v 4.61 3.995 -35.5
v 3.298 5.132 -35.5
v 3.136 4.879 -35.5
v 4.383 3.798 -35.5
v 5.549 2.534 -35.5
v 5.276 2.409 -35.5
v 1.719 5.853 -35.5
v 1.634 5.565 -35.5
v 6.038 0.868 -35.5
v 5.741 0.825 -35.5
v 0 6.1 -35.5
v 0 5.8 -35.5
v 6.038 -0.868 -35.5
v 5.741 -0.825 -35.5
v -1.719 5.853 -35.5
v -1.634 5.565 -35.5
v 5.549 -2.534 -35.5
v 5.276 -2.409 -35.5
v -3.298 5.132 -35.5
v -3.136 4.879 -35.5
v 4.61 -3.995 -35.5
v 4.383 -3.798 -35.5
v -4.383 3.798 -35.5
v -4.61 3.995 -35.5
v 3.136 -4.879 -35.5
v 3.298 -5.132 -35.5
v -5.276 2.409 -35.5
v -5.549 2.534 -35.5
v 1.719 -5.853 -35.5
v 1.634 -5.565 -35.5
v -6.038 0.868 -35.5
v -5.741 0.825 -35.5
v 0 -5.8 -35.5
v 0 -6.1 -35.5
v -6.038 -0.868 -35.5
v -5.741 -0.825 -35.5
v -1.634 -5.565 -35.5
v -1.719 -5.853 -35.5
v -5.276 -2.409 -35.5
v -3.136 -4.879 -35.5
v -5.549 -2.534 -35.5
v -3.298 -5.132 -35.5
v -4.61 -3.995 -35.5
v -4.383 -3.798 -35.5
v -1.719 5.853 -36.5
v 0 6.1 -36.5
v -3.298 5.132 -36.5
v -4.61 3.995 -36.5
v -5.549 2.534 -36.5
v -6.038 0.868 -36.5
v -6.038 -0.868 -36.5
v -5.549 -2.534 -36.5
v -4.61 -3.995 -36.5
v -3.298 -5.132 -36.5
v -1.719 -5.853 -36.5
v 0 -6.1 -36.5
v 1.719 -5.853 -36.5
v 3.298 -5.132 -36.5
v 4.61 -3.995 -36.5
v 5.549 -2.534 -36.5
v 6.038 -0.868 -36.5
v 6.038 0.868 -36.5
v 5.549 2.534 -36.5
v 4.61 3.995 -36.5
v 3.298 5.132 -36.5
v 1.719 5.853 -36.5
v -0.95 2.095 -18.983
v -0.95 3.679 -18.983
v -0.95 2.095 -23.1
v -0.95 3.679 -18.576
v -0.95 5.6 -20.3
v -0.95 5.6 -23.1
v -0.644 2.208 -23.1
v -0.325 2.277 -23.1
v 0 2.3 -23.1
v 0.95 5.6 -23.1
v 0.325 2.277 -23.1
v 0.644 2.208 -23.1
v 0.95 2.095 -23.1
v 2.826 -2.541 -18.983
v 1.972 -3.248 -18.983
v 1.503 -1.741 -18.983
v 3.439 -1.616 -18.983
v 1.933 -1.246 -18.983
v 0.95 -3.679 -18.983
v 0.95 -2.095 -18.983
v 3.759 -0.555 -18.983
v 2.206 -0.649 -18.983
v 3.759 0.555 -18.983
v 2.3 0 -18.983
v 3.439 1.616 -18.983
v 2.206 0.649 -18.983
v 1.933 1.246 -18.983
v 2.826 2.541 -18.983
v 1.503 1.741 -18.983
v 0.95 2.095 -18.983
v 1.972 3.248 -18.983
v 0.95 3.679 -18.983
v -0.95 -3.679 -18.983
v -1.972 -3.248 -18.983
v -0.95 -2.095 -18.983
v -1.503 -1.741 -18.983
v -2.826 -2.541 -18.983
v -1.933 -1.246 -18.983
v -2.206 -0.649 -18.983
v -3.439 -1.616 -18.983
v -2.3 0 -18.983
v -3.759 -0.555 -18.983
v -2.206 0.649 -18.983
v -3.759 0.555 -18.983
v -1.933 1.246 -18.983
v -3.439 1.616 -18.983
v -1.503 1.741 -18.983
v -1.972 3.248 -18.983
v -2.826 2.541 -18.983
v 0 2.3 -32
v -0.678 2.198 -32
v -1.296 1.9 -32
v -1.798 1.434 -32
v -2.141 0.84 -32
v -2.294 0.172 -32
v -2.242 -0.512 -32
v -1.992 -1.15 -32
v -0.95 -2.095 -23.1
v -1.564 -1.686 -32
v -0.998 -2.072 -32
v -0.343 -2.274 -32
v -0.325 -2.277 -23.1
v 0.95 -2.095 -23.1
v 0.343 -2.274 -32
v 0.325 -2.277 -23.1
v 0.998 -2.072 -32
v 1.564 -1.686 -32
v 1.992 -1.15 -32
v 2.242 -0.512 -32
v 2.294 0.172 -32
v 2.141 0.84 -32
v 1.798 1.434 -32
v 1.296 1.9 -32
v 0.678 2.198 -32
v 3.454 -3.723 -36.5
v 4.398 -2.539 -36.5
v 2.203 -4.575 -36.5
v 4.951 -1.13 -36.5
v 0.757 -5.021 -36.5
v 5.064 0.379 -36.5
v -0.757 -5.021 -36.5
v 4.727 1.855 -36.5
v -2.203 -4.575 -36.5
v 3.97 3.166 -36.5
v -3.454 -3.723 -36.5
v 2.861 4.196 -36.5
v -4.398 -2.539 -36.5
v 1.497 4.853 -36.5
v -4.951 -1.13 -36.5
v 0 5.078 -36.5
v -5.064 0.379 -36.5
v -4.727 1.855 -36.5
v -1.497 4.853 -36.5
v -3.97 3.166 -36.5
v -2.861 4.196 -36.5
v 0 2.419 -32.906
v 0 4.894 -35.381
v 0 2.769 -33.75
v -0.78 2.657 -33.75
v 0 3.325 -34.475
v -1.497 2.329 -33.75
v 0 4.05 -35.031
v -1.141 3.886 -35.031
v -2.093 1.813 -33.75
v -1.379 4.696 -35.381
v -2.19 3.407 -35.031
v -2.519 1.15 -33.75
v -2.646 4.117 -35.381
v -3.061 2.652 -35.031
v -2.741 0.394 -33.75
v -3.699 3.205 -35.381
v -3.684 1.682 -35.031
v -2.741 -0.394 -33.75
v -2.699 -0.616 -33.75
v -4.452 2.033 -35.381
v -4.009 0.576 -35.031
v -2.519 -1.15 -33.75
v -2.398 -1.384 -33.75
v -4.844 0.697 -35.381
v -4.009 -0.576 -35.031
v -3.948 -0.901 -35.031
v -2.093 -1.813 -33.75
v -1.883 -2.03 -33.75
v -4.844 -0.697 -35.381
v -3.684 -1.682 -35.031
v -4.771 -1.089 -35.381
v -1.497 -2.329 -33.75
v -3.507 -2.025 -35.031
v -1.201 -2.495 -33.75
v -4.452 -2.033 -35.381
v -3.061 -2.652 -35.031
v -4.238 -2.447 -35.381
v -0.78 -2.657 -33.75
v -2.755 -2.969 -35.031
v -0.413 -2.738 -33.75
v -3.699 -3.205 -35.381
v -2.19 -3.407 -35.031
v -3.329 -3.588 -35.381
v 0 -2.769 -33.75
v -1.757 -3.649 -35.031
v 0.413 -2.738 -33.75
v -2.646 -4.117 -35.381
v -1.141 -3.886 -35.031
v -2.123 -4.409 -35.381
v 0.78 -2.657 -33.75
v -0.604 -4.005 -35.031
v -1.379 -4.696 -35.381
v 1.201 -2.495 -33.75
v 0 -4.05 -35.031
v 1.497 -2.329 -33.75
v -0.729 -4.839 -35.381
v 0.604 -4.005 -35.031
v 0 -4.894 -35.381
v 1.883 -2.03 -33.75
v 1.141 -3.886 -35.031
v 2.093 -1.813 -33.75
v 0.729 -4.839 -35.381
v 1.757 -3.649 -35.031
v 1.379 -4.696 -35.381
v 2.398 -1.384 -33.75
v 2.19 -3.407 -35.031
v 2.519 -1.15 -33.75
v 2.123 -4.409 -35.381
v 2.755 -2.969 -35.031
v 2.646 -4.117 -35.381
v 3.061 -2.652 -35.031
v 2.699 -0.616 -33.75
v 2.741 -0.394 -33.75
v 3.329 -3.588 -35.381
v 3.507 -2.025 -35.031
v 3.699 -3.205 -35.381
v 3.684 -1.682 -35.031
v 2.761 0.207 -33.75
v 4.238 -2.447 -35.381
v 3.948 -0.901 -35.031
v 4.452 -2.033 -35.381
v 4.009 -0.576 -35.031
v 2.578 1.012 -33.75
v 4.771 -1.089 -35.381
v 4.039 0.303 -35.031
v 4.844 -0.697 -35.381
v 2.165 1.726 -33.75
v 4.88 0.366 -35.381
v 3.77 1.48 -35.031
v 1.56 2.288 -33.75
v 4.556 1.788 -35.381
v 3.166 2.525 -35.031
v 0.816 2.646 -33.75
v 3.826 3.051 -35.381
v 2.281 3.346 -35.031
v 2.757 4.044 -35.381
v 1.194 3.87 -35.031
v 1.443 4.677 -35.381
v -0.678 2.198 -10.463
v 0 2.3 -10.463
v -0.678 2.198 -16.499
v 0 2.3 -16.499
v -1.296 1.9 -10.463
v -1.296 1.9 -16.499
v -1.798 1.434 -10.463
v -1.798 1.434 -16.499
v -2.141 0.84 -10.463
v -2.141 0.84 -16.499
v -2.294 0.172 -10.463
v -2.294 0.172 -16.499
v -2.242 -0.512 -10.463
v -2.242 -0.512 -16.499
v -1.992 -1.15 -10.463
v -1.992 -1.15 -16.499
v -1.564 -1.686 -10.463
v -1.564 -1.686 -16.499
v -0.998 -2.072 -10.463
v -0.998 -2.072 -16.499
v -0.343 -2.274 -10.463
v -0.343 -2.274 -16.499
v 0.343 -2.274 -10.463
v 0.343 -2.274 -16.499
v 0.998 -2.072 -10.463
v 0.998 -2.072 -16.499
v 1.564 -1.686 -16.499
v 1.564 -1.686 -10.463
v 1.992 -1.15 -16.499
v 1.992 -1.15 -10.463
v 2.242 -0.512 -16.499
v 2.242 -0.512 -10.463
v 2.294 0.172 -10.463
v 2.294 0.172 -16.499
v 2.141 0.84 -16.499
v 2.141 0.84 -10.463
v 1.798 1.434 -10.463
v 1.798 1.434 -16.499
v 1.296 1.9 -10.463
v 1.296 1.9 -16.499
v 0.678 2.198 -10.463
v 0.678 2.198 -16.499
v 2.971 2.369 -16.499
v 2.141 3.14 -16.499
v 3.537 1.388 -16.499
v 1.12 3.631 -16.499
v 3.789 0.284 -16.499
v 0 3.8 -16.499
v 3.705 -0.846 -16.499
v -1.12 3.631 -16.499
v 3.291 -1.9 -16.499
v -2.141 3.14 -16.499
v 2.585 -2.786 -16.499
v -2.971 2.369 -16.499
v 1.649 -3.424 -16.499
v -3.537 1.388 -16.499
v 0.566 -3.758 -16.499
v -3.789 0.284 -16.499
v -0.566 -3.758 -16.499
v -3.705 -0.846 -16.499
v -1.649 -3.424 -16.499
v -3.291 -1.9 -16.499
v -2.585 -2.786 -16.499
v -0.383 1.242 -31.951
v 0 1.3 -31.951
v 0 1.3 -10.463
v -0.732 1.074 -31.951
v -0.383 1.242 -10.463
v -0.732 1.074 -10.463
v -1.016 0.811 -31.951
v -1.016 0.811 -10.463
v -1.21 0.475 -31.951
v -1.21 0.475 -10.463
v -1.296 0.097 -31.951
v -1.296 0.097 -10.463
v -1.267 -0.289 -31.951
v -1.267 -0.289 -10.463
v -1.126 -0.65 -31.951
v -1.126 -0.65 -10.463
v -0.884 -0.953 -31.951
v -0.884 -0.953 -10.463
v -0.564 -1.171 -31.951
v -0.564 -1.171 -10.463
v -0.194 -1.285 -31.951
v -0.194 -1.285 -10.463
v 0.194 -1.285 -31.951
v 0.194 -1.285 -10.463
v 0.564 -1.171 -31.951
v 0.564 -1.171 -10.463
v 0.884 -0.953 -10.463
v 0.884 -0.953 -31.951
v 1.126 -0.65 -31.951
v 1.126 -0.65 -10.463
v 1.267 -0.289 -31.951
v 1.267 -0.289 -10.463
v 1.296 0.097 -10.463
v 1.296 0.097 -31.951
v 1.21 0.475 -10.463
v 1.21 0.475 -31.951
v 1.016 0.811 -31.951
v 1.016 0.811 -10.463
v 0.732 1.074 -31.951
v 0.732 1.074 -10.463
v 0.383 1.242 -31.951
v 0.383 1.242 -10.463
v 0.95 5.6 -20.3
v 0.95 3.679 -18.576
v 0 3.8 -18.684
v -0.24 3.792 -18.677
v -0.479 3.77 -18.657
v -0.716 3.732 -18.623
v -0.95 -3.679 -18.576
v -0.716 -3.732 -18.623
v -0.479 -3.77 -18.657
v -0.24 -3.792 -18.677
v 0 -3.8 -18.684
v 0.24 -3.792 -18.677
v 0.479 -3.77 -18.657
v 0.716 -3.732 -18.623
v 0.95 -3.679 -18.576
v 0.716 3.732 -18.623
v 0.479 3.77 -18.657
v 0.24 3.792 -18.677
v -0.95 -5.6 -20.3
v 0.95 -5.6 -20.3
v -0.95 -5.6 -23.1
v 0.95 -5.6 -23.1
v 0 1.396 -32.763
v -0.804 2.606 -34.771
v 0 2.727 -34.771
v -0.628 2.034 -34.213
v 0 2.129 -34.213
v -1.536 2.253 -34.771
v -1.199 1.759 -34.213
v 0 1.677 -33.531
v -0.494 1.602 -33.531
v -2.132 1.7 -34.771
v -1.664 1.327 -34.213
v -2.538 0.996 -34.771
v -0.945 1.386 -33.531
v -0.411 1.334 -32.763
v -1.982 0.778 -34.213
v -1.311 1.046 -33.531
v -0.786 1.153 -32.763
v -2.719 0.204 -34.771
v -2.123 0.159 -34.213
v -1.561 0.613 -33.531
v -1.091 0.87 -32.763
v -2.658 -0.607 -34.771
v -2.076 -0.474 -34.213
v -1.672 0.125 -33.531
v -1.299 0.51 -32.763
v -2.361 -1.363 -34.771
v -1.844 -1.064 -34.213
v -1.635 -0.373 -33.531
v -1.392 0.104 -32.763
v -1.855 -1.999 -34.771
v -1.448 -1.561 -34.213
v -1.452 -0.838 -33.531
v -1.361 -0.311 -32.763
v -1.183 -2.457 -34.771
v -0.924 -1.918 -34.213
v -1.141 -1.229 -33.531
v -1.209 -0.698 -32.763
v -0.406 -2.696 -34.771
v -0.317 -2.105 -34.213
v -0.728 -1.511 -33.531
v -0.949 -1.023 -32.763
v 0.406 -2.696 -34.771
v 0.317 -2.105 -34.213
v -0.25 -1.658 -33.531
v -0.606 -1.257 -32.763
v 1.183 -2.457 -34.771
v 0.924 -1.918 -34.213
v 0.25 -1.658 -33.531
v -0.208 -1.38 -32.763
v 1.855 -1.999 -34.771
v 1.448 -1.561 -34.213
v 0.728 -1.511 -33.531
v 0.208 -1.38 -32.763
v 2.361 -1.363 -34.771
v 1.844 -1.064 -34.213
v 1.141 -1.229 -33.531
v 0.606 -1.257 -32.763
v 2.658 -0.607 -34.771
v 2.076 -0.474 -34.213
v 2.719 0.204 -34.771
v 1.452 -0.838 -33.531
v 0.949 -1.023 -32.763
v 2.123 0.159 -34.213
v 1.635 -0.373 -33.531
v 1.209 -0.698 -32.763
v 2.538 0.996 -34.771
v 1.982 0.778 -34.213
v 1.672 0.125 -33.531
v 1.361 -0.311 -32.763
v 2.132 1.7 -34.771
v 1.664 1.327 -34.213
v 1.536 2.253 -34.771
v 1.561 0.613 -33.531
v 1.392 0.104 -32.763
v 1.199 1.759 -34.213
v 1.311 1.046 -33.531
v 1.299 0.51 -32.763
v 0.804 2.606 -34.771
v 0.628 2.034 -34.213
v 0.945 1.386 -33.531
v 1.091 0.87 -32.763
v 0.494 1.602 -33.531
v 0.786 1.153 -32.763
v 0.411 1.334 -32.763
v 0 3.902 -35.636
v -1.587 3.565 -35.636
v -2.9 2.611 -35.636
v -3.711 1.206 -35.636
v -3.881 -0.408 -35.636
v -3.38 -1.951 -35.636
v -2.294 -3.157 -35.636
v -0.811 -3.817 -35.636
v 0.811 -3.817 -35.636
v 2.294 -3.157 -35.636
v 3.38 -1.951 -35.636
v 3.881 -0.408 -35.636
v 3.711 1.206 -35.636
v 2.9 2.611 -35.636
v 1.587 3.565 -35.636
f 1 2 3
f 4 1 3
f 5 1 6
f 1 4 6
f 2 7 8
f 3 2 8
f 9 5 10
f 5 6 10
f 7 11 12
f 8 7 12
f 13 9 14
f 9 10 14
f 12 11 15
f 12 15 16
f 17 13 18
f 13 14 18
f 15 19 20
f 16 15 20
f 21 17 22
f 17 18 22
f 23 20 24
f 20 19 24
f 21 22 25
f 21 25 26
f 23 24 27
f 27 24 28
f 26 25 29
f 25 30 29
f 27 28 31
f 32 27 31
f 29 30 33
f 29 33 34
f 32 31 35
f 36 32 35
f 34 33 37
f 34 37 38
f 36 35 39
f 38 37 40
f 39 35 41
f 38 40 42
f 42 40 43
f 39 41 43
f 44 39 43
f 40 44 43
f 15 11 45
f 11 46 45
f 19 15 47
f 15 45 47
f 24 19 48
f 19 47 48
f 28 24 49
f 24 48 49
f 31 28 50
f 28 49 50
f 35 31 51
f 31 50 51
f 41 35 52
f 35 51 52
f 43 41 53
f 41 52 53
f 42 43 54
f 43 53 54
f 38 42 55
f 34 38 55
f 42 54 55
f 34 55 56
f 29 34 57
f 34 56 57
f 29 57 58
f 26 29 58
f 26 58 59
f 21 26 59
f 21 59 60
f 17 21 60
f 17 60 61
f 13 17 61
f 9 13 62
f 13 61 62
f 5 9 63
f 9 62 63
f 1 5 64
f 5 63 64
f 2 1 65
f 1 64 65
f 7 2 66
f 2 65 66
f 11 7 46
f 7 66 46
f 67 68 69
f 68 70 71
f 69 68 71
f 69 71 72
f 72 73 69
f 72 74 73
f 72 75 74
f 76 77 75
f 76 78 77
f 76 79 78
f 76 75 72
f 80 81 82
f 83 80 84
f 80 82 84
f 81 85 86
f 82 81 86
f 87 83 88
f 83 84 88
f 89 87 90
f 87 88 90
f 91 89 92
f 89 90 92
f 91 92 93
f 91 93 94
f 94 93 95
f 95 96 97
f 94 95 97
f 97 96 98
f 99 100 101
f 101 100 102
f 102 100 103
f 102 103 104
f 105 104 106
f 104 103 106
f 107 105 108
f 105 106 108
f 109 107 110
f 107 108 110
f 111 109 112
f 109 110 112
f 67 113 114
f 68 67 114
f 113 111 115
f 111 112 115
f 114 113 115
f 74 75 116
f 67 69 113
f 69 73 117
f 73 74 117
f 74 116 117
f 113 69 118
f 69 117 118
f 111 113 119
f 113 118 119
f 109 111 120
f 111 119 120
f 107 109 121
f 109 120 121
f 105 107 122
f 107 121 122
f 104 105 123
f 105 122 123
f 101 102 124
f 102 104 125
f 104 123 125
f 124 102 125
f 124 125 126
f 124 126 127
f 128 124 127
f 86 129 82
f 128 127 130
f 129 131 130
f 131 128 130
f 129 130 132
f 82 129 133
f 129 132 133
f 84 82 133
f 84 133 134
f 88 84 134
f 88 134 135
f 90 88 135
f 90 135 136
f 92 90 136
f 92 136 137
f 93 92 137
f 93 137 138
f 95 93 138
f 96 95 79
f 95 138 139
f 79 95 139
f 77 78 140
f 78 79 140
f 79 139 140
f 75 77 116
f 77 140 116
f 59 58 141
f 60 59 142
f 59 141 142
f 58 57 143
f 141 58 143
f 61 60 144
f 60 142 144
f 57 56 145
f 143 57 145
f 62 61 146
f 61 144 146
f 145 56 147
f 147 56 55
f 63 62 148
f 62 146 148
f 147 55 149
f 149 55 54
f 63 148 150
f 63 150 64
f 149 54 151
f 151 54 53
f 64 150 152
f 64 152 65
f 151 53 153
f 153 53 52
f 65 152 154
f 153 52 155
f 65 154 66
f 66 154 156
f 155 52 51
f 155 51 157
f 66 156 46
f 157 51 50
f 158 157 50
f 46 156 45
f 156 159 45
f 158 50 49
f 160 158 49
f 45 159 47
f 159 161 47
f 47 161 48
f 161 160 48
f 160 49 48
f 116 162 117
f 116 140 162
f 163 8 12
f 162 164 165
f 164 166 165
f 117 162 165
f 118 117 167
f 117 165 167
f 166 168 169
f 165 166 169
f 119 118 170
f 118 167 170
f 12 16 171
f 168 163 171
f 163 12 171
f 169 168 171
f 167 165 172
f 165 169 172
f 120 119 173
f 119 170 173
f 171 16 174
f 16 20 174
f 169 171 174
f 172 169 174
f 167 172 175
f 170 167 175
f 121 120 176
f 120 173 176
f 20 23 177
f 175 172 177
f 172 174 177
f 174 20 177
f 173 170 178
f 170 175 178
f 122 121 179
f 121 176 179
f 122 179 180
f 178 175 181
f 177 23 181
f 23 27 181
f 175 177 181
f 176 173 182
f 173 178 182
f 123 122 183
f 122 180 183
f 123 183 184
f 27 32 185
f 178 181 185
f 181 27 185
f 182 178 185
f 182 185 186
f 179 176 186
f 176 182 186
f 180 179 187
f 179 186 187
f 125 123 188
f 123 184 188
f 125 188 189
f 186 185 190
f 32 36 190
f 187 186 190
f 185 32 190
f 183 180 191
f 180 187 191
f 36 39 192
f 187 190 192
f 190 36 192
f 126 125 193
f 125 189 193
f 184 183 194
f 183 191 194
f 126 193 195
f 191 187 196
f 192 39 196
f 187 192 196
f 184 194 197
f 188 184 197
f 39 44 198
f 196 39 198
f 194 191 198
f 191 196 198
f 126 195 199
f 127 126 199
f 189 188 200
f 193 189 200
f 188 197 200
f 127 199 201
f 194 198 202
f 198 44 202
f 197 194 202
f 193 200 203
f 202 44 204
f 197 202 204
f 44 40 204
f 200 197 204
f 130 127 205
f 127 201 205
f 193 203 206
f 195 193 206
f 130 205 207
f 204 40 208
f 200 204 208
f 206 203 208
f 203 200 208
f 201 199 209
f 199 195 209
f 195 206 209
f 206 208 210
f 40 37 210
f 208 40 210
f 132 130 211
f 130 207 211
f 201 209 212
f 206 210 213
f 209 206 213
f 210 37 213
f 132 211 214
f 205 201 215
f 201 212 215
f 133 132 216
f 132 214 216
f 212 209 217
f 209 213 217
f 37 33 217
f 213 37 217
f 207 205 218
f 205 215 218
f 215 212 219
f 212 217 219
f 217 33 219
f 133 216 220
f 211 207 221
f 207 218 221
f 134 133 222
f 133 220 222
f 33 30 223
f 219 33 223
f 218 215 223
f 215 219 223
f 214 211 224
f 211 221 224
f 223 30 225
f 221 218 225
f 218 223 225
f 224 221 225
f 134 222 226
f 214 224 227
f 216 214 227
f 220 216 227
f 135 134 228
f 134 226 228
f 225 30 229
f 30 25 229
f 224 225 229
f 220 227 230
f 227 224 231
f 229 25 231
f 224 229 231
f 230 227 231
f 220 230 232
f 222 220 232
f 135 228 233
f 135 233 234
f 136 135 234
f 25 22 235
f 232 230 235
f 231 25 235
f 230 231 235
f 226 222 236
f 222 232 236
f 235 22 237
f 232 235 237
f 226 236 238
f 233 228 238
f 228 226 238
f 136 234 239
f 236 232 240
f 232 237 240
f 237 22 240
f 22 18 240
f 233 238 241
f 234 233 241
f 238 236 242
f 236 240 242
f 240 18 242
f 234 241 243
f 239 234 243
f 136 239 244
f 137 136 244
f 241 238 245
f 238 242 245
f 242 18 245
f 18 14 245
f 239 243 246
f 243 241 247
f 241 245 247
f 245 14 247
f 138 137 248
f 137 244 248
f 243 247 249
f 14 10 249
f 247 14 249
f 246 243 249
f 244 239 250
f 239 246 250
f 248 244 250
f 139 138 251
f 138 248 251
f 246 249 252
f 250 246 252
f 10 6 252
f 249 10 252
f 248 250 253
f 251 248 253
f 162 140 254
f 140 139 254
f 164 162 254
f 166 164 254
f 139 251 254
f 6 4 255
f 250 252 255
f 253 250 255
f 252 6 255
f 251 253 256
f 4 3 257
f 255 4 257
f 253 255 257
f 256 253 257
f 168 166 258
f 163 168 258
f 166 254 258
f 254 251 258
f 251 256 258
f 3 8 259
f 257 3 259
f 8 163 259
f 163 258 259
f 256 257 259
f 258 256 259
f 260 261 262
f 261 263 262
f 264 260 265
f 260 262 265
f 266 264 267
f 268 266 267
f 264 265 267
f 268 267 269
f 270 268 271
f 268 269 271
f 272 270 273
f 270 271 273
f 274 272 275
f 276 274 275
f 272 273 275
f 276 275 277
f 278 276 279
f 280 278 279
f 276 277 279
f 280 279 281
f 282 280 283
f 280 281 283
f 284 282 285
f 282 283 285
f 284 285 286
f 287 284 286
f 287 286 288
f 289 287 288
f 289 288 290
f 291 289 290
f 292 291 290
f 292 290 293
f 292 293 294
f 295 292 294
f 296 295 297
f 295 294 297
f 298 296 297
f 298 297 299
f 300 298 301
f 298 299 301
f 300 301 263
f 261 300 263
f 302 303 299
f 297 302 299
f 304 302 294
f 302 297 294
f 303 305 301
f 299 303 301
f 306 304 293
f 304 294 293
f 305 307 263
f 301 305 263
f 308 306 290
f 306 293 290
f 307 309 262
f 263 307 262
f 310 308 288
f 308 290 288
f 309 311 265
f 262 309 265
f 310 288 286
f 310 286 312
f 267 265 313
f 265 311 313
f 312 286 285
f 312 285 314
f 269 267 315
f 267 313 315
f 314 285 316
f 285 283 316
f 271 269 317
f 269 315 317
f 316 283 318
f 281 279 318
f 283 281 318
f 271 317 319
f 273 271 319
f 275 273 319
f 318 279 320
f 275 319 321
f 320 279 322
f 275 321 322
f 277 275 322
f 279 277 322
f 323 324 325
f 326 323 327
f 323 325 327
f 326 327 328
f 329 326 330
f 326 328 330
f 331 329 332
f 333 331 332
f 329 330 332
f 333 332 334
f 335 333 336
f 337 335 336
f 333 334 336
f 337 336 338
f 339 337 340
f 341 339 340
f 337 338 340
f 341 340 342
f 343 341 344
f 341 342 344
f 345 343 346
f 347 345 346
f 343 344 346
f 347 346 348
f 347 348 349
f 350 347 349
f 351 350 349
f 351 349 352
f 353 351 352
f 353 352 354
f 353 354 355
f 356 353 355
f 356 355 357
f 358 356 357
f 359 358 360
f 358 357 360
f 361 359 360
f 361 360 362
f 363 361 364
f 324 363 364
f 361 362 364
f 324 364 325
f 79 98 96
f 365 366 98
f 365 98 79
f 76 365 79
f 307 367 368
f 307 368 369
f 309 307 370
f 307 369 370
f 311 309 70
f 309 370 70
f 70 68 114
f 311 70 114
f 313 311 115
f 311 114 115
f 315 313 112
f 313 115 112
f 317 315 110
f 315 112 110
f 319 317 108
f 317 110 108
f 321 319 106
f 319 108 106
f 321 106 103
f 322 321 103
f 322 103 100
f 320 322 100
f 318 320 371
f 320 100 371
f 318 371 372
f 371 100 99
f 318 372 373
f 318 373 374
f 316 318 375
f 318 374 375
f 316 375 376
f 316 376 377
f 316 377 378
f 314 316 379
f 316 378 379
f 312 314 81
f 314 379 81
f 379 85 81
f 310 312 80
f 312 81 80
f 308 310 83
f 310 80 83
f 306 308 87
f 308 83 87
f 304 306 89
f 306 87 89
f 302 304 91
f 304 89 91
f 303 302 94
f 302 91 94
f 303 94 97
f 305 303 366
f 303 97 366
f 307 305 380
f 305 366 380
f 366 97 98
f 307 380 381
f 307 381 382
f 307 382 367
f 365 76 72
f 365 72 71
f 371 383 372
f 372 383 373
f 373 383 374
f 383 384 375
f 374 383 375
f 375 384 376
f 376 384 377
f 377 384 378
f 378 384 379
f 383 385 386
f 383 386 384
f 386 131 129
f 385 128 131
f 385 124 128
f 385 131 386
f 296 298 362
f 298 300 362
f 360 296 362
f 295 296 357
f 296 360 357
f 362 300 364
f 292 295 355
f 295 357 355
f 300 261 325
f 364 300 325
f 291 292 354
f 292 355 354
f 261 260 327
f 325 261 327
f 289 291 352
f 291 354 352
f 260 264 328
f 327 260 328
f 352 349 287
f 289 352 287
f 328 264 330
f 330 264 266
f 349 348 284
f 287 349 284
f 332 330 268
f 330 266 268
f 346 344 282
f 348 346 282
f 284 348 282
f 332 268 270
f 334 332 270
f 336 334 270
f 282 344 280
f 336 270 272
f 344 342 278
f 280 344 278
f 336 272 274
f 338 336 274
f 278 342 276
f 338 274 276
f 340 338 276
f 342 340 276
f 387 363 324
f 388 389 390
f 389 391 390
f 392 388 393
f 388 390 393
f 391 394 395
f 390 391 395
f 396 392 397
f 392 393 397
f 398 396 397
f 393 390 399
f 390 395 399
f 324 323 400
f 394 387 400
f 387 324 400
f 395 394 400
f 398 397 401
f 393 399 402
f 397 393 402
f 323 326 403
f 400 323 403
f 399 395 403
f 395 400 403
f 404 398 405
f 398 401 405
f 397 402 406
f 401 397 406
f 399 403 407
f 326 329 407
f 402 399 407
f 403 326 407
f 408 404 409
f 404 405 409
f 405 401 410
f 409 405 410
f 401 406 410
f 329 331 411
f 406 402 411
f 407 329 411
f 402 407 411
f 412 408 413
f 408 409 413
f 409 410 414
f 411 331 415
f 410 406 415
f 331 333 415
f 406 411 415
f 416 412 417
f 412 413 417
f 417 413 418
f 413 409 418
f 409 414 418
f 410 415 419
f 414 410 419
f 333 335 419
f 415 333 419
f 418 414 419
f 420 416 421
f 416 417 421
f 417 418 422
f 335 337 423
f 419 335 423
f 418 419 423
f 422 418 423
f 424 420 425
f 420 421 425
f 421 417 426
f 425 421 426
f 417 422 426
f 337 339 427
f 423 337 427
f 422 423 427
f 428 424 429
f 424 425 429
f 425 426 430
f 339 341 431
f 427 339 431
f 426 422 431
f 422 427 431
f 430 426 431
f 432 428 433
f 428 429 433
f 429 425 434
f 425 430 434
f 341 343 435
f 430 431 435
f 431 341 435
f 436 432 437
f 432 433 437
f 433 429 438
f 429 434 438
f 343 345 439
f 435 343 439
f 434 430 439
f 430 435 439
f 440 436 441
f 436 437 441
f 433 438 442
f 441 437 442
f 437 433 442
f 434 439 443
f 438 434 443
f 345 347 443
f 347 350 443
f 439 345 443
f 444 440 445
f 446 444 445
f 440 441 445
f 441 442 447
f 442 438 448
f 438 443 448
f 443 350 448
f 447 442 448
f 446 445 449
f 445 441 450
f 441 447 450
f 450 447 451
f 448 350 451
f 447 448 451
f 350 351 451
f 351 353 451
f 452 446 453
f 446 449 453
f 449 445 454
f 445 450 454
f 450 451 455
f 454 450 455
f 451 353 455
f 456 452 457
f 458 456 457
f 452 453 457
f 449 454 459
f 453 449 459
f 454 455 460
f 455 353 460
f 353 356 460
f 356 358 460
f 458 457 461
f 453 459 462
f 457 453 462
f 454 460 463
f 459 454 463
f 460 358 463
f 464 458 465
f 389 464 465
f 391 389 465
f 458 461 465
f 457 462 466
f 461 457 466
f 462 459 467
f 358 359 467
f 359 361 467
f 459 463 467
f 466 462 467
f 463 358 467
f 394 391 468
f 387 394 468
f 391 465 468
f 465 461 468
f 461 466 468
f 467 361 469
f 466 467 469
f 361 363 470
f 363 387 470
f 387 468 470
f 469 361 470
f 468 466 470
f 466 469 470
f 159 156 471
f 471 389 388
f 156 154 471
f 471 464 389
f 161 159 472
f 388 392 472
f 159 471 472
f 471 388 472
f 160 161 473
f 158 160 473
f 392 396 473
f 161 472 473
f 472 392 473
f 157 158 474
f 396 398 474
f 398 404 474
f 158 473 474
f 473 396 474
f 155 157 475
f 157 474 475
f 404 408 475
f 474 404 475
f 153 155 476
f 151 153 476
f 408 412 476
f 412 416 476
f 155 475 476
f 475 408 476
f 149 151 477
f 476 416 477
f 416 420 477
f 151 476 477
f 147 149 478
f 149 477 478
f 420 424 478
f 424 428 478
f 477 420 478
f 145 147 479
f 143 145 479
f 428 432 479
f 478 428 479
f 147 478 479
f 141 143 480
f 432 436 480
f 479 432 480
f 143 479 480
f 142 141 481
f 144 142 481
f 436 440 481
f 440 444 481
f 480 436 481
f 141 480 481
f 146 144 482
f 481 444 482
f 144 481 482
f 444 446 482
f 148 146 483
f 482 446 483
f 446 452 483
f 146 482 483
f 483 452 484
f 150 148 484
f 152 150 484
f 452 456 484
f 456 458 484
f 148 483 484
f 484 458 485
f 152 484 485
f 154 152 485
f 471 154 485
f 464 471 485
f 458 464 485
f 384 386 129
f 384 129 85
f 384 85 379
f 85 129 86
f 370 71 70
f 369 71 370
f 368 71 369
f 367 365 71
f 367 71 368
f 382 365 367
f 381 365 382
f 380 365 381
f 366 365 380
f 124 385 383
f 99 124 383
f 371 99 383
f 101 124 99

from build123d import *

# Parameters (mm, degrees)
BOSS_EXTRUDE1_DEPTH      = 0.95
BOSS_EXTRUDE1_DEPTH_BACK = 0.95


with BuildPart() as part:
    # Sketch1 → Revolve1 (revolve)
    with BuildSketch(Plane(origin=(0, 0, 0), x_dir=(0, 0, -1), z_dir=(1, 0, 0))):
        with BuildLine():
            Line((10.463274616, 2.3), (16.499380089, 2.3))
            Line((16.499380089, 2.3), (16.499380089, 3.8))
            Line((16.499380089, 3.8), (18.983450943, 3.8))
            Line((18.983450943, 3.8), (18.983450943, 2.3))
            Line((18.983450943, 2.3), (32, 2.3))
            ThreePointArc((32, 2.3), (34.474873734, 3.325126266), (35.5, 5.8))
            Line((35.5, 5.8), (35.5, 6.1))
            Line((35.5, 6.1), (36.5, 6.1))
            Line((36.5, 6.1), (36.5, 5.078211692))
            Line((36.5, 5.078211692), (34.771119215, 2.72674277))
            ThreePointArc((34.771119215, 2.72674277), (33.531386801, 1.676988608), (31.951260272, 1.3))
            Line((31.951260272, 1.3), (10.463274616, 1.3))
            Line((10.463274616, 1.3), (10.463274616, 2.3))
        make_face()
    revolve(axis=Axis((0, 0, -15.3), (0, 0, 1)))

    # Sketch2 → Boss-Extrude1 (add, two sides: drawn at the far end of the back side and taken through both)
    with BuildSketch(Plane(origin=(0, 0, 0), x_dir=(0, 0, -1), z_dir=(1, 0, 0)).offset(-BOSS_EXTRUDE1_DEPTH_BACK)):
        Polygon((23.1, 1.460737541), (23.1, 5.6), (20.3, 5.6), (16.583846242, 1.460737541), align=None)
        Polygon((16.583846242, -1.460737541), (23.1, -1.460737541), (23.1, -5.6), (20.3, -5.6), align=None)
    extrude(amount=BOSS_EXTRUDE1_DEPTH + BOSS_EXTRUDE1_DEPTH_BACK)


solid = part.part
